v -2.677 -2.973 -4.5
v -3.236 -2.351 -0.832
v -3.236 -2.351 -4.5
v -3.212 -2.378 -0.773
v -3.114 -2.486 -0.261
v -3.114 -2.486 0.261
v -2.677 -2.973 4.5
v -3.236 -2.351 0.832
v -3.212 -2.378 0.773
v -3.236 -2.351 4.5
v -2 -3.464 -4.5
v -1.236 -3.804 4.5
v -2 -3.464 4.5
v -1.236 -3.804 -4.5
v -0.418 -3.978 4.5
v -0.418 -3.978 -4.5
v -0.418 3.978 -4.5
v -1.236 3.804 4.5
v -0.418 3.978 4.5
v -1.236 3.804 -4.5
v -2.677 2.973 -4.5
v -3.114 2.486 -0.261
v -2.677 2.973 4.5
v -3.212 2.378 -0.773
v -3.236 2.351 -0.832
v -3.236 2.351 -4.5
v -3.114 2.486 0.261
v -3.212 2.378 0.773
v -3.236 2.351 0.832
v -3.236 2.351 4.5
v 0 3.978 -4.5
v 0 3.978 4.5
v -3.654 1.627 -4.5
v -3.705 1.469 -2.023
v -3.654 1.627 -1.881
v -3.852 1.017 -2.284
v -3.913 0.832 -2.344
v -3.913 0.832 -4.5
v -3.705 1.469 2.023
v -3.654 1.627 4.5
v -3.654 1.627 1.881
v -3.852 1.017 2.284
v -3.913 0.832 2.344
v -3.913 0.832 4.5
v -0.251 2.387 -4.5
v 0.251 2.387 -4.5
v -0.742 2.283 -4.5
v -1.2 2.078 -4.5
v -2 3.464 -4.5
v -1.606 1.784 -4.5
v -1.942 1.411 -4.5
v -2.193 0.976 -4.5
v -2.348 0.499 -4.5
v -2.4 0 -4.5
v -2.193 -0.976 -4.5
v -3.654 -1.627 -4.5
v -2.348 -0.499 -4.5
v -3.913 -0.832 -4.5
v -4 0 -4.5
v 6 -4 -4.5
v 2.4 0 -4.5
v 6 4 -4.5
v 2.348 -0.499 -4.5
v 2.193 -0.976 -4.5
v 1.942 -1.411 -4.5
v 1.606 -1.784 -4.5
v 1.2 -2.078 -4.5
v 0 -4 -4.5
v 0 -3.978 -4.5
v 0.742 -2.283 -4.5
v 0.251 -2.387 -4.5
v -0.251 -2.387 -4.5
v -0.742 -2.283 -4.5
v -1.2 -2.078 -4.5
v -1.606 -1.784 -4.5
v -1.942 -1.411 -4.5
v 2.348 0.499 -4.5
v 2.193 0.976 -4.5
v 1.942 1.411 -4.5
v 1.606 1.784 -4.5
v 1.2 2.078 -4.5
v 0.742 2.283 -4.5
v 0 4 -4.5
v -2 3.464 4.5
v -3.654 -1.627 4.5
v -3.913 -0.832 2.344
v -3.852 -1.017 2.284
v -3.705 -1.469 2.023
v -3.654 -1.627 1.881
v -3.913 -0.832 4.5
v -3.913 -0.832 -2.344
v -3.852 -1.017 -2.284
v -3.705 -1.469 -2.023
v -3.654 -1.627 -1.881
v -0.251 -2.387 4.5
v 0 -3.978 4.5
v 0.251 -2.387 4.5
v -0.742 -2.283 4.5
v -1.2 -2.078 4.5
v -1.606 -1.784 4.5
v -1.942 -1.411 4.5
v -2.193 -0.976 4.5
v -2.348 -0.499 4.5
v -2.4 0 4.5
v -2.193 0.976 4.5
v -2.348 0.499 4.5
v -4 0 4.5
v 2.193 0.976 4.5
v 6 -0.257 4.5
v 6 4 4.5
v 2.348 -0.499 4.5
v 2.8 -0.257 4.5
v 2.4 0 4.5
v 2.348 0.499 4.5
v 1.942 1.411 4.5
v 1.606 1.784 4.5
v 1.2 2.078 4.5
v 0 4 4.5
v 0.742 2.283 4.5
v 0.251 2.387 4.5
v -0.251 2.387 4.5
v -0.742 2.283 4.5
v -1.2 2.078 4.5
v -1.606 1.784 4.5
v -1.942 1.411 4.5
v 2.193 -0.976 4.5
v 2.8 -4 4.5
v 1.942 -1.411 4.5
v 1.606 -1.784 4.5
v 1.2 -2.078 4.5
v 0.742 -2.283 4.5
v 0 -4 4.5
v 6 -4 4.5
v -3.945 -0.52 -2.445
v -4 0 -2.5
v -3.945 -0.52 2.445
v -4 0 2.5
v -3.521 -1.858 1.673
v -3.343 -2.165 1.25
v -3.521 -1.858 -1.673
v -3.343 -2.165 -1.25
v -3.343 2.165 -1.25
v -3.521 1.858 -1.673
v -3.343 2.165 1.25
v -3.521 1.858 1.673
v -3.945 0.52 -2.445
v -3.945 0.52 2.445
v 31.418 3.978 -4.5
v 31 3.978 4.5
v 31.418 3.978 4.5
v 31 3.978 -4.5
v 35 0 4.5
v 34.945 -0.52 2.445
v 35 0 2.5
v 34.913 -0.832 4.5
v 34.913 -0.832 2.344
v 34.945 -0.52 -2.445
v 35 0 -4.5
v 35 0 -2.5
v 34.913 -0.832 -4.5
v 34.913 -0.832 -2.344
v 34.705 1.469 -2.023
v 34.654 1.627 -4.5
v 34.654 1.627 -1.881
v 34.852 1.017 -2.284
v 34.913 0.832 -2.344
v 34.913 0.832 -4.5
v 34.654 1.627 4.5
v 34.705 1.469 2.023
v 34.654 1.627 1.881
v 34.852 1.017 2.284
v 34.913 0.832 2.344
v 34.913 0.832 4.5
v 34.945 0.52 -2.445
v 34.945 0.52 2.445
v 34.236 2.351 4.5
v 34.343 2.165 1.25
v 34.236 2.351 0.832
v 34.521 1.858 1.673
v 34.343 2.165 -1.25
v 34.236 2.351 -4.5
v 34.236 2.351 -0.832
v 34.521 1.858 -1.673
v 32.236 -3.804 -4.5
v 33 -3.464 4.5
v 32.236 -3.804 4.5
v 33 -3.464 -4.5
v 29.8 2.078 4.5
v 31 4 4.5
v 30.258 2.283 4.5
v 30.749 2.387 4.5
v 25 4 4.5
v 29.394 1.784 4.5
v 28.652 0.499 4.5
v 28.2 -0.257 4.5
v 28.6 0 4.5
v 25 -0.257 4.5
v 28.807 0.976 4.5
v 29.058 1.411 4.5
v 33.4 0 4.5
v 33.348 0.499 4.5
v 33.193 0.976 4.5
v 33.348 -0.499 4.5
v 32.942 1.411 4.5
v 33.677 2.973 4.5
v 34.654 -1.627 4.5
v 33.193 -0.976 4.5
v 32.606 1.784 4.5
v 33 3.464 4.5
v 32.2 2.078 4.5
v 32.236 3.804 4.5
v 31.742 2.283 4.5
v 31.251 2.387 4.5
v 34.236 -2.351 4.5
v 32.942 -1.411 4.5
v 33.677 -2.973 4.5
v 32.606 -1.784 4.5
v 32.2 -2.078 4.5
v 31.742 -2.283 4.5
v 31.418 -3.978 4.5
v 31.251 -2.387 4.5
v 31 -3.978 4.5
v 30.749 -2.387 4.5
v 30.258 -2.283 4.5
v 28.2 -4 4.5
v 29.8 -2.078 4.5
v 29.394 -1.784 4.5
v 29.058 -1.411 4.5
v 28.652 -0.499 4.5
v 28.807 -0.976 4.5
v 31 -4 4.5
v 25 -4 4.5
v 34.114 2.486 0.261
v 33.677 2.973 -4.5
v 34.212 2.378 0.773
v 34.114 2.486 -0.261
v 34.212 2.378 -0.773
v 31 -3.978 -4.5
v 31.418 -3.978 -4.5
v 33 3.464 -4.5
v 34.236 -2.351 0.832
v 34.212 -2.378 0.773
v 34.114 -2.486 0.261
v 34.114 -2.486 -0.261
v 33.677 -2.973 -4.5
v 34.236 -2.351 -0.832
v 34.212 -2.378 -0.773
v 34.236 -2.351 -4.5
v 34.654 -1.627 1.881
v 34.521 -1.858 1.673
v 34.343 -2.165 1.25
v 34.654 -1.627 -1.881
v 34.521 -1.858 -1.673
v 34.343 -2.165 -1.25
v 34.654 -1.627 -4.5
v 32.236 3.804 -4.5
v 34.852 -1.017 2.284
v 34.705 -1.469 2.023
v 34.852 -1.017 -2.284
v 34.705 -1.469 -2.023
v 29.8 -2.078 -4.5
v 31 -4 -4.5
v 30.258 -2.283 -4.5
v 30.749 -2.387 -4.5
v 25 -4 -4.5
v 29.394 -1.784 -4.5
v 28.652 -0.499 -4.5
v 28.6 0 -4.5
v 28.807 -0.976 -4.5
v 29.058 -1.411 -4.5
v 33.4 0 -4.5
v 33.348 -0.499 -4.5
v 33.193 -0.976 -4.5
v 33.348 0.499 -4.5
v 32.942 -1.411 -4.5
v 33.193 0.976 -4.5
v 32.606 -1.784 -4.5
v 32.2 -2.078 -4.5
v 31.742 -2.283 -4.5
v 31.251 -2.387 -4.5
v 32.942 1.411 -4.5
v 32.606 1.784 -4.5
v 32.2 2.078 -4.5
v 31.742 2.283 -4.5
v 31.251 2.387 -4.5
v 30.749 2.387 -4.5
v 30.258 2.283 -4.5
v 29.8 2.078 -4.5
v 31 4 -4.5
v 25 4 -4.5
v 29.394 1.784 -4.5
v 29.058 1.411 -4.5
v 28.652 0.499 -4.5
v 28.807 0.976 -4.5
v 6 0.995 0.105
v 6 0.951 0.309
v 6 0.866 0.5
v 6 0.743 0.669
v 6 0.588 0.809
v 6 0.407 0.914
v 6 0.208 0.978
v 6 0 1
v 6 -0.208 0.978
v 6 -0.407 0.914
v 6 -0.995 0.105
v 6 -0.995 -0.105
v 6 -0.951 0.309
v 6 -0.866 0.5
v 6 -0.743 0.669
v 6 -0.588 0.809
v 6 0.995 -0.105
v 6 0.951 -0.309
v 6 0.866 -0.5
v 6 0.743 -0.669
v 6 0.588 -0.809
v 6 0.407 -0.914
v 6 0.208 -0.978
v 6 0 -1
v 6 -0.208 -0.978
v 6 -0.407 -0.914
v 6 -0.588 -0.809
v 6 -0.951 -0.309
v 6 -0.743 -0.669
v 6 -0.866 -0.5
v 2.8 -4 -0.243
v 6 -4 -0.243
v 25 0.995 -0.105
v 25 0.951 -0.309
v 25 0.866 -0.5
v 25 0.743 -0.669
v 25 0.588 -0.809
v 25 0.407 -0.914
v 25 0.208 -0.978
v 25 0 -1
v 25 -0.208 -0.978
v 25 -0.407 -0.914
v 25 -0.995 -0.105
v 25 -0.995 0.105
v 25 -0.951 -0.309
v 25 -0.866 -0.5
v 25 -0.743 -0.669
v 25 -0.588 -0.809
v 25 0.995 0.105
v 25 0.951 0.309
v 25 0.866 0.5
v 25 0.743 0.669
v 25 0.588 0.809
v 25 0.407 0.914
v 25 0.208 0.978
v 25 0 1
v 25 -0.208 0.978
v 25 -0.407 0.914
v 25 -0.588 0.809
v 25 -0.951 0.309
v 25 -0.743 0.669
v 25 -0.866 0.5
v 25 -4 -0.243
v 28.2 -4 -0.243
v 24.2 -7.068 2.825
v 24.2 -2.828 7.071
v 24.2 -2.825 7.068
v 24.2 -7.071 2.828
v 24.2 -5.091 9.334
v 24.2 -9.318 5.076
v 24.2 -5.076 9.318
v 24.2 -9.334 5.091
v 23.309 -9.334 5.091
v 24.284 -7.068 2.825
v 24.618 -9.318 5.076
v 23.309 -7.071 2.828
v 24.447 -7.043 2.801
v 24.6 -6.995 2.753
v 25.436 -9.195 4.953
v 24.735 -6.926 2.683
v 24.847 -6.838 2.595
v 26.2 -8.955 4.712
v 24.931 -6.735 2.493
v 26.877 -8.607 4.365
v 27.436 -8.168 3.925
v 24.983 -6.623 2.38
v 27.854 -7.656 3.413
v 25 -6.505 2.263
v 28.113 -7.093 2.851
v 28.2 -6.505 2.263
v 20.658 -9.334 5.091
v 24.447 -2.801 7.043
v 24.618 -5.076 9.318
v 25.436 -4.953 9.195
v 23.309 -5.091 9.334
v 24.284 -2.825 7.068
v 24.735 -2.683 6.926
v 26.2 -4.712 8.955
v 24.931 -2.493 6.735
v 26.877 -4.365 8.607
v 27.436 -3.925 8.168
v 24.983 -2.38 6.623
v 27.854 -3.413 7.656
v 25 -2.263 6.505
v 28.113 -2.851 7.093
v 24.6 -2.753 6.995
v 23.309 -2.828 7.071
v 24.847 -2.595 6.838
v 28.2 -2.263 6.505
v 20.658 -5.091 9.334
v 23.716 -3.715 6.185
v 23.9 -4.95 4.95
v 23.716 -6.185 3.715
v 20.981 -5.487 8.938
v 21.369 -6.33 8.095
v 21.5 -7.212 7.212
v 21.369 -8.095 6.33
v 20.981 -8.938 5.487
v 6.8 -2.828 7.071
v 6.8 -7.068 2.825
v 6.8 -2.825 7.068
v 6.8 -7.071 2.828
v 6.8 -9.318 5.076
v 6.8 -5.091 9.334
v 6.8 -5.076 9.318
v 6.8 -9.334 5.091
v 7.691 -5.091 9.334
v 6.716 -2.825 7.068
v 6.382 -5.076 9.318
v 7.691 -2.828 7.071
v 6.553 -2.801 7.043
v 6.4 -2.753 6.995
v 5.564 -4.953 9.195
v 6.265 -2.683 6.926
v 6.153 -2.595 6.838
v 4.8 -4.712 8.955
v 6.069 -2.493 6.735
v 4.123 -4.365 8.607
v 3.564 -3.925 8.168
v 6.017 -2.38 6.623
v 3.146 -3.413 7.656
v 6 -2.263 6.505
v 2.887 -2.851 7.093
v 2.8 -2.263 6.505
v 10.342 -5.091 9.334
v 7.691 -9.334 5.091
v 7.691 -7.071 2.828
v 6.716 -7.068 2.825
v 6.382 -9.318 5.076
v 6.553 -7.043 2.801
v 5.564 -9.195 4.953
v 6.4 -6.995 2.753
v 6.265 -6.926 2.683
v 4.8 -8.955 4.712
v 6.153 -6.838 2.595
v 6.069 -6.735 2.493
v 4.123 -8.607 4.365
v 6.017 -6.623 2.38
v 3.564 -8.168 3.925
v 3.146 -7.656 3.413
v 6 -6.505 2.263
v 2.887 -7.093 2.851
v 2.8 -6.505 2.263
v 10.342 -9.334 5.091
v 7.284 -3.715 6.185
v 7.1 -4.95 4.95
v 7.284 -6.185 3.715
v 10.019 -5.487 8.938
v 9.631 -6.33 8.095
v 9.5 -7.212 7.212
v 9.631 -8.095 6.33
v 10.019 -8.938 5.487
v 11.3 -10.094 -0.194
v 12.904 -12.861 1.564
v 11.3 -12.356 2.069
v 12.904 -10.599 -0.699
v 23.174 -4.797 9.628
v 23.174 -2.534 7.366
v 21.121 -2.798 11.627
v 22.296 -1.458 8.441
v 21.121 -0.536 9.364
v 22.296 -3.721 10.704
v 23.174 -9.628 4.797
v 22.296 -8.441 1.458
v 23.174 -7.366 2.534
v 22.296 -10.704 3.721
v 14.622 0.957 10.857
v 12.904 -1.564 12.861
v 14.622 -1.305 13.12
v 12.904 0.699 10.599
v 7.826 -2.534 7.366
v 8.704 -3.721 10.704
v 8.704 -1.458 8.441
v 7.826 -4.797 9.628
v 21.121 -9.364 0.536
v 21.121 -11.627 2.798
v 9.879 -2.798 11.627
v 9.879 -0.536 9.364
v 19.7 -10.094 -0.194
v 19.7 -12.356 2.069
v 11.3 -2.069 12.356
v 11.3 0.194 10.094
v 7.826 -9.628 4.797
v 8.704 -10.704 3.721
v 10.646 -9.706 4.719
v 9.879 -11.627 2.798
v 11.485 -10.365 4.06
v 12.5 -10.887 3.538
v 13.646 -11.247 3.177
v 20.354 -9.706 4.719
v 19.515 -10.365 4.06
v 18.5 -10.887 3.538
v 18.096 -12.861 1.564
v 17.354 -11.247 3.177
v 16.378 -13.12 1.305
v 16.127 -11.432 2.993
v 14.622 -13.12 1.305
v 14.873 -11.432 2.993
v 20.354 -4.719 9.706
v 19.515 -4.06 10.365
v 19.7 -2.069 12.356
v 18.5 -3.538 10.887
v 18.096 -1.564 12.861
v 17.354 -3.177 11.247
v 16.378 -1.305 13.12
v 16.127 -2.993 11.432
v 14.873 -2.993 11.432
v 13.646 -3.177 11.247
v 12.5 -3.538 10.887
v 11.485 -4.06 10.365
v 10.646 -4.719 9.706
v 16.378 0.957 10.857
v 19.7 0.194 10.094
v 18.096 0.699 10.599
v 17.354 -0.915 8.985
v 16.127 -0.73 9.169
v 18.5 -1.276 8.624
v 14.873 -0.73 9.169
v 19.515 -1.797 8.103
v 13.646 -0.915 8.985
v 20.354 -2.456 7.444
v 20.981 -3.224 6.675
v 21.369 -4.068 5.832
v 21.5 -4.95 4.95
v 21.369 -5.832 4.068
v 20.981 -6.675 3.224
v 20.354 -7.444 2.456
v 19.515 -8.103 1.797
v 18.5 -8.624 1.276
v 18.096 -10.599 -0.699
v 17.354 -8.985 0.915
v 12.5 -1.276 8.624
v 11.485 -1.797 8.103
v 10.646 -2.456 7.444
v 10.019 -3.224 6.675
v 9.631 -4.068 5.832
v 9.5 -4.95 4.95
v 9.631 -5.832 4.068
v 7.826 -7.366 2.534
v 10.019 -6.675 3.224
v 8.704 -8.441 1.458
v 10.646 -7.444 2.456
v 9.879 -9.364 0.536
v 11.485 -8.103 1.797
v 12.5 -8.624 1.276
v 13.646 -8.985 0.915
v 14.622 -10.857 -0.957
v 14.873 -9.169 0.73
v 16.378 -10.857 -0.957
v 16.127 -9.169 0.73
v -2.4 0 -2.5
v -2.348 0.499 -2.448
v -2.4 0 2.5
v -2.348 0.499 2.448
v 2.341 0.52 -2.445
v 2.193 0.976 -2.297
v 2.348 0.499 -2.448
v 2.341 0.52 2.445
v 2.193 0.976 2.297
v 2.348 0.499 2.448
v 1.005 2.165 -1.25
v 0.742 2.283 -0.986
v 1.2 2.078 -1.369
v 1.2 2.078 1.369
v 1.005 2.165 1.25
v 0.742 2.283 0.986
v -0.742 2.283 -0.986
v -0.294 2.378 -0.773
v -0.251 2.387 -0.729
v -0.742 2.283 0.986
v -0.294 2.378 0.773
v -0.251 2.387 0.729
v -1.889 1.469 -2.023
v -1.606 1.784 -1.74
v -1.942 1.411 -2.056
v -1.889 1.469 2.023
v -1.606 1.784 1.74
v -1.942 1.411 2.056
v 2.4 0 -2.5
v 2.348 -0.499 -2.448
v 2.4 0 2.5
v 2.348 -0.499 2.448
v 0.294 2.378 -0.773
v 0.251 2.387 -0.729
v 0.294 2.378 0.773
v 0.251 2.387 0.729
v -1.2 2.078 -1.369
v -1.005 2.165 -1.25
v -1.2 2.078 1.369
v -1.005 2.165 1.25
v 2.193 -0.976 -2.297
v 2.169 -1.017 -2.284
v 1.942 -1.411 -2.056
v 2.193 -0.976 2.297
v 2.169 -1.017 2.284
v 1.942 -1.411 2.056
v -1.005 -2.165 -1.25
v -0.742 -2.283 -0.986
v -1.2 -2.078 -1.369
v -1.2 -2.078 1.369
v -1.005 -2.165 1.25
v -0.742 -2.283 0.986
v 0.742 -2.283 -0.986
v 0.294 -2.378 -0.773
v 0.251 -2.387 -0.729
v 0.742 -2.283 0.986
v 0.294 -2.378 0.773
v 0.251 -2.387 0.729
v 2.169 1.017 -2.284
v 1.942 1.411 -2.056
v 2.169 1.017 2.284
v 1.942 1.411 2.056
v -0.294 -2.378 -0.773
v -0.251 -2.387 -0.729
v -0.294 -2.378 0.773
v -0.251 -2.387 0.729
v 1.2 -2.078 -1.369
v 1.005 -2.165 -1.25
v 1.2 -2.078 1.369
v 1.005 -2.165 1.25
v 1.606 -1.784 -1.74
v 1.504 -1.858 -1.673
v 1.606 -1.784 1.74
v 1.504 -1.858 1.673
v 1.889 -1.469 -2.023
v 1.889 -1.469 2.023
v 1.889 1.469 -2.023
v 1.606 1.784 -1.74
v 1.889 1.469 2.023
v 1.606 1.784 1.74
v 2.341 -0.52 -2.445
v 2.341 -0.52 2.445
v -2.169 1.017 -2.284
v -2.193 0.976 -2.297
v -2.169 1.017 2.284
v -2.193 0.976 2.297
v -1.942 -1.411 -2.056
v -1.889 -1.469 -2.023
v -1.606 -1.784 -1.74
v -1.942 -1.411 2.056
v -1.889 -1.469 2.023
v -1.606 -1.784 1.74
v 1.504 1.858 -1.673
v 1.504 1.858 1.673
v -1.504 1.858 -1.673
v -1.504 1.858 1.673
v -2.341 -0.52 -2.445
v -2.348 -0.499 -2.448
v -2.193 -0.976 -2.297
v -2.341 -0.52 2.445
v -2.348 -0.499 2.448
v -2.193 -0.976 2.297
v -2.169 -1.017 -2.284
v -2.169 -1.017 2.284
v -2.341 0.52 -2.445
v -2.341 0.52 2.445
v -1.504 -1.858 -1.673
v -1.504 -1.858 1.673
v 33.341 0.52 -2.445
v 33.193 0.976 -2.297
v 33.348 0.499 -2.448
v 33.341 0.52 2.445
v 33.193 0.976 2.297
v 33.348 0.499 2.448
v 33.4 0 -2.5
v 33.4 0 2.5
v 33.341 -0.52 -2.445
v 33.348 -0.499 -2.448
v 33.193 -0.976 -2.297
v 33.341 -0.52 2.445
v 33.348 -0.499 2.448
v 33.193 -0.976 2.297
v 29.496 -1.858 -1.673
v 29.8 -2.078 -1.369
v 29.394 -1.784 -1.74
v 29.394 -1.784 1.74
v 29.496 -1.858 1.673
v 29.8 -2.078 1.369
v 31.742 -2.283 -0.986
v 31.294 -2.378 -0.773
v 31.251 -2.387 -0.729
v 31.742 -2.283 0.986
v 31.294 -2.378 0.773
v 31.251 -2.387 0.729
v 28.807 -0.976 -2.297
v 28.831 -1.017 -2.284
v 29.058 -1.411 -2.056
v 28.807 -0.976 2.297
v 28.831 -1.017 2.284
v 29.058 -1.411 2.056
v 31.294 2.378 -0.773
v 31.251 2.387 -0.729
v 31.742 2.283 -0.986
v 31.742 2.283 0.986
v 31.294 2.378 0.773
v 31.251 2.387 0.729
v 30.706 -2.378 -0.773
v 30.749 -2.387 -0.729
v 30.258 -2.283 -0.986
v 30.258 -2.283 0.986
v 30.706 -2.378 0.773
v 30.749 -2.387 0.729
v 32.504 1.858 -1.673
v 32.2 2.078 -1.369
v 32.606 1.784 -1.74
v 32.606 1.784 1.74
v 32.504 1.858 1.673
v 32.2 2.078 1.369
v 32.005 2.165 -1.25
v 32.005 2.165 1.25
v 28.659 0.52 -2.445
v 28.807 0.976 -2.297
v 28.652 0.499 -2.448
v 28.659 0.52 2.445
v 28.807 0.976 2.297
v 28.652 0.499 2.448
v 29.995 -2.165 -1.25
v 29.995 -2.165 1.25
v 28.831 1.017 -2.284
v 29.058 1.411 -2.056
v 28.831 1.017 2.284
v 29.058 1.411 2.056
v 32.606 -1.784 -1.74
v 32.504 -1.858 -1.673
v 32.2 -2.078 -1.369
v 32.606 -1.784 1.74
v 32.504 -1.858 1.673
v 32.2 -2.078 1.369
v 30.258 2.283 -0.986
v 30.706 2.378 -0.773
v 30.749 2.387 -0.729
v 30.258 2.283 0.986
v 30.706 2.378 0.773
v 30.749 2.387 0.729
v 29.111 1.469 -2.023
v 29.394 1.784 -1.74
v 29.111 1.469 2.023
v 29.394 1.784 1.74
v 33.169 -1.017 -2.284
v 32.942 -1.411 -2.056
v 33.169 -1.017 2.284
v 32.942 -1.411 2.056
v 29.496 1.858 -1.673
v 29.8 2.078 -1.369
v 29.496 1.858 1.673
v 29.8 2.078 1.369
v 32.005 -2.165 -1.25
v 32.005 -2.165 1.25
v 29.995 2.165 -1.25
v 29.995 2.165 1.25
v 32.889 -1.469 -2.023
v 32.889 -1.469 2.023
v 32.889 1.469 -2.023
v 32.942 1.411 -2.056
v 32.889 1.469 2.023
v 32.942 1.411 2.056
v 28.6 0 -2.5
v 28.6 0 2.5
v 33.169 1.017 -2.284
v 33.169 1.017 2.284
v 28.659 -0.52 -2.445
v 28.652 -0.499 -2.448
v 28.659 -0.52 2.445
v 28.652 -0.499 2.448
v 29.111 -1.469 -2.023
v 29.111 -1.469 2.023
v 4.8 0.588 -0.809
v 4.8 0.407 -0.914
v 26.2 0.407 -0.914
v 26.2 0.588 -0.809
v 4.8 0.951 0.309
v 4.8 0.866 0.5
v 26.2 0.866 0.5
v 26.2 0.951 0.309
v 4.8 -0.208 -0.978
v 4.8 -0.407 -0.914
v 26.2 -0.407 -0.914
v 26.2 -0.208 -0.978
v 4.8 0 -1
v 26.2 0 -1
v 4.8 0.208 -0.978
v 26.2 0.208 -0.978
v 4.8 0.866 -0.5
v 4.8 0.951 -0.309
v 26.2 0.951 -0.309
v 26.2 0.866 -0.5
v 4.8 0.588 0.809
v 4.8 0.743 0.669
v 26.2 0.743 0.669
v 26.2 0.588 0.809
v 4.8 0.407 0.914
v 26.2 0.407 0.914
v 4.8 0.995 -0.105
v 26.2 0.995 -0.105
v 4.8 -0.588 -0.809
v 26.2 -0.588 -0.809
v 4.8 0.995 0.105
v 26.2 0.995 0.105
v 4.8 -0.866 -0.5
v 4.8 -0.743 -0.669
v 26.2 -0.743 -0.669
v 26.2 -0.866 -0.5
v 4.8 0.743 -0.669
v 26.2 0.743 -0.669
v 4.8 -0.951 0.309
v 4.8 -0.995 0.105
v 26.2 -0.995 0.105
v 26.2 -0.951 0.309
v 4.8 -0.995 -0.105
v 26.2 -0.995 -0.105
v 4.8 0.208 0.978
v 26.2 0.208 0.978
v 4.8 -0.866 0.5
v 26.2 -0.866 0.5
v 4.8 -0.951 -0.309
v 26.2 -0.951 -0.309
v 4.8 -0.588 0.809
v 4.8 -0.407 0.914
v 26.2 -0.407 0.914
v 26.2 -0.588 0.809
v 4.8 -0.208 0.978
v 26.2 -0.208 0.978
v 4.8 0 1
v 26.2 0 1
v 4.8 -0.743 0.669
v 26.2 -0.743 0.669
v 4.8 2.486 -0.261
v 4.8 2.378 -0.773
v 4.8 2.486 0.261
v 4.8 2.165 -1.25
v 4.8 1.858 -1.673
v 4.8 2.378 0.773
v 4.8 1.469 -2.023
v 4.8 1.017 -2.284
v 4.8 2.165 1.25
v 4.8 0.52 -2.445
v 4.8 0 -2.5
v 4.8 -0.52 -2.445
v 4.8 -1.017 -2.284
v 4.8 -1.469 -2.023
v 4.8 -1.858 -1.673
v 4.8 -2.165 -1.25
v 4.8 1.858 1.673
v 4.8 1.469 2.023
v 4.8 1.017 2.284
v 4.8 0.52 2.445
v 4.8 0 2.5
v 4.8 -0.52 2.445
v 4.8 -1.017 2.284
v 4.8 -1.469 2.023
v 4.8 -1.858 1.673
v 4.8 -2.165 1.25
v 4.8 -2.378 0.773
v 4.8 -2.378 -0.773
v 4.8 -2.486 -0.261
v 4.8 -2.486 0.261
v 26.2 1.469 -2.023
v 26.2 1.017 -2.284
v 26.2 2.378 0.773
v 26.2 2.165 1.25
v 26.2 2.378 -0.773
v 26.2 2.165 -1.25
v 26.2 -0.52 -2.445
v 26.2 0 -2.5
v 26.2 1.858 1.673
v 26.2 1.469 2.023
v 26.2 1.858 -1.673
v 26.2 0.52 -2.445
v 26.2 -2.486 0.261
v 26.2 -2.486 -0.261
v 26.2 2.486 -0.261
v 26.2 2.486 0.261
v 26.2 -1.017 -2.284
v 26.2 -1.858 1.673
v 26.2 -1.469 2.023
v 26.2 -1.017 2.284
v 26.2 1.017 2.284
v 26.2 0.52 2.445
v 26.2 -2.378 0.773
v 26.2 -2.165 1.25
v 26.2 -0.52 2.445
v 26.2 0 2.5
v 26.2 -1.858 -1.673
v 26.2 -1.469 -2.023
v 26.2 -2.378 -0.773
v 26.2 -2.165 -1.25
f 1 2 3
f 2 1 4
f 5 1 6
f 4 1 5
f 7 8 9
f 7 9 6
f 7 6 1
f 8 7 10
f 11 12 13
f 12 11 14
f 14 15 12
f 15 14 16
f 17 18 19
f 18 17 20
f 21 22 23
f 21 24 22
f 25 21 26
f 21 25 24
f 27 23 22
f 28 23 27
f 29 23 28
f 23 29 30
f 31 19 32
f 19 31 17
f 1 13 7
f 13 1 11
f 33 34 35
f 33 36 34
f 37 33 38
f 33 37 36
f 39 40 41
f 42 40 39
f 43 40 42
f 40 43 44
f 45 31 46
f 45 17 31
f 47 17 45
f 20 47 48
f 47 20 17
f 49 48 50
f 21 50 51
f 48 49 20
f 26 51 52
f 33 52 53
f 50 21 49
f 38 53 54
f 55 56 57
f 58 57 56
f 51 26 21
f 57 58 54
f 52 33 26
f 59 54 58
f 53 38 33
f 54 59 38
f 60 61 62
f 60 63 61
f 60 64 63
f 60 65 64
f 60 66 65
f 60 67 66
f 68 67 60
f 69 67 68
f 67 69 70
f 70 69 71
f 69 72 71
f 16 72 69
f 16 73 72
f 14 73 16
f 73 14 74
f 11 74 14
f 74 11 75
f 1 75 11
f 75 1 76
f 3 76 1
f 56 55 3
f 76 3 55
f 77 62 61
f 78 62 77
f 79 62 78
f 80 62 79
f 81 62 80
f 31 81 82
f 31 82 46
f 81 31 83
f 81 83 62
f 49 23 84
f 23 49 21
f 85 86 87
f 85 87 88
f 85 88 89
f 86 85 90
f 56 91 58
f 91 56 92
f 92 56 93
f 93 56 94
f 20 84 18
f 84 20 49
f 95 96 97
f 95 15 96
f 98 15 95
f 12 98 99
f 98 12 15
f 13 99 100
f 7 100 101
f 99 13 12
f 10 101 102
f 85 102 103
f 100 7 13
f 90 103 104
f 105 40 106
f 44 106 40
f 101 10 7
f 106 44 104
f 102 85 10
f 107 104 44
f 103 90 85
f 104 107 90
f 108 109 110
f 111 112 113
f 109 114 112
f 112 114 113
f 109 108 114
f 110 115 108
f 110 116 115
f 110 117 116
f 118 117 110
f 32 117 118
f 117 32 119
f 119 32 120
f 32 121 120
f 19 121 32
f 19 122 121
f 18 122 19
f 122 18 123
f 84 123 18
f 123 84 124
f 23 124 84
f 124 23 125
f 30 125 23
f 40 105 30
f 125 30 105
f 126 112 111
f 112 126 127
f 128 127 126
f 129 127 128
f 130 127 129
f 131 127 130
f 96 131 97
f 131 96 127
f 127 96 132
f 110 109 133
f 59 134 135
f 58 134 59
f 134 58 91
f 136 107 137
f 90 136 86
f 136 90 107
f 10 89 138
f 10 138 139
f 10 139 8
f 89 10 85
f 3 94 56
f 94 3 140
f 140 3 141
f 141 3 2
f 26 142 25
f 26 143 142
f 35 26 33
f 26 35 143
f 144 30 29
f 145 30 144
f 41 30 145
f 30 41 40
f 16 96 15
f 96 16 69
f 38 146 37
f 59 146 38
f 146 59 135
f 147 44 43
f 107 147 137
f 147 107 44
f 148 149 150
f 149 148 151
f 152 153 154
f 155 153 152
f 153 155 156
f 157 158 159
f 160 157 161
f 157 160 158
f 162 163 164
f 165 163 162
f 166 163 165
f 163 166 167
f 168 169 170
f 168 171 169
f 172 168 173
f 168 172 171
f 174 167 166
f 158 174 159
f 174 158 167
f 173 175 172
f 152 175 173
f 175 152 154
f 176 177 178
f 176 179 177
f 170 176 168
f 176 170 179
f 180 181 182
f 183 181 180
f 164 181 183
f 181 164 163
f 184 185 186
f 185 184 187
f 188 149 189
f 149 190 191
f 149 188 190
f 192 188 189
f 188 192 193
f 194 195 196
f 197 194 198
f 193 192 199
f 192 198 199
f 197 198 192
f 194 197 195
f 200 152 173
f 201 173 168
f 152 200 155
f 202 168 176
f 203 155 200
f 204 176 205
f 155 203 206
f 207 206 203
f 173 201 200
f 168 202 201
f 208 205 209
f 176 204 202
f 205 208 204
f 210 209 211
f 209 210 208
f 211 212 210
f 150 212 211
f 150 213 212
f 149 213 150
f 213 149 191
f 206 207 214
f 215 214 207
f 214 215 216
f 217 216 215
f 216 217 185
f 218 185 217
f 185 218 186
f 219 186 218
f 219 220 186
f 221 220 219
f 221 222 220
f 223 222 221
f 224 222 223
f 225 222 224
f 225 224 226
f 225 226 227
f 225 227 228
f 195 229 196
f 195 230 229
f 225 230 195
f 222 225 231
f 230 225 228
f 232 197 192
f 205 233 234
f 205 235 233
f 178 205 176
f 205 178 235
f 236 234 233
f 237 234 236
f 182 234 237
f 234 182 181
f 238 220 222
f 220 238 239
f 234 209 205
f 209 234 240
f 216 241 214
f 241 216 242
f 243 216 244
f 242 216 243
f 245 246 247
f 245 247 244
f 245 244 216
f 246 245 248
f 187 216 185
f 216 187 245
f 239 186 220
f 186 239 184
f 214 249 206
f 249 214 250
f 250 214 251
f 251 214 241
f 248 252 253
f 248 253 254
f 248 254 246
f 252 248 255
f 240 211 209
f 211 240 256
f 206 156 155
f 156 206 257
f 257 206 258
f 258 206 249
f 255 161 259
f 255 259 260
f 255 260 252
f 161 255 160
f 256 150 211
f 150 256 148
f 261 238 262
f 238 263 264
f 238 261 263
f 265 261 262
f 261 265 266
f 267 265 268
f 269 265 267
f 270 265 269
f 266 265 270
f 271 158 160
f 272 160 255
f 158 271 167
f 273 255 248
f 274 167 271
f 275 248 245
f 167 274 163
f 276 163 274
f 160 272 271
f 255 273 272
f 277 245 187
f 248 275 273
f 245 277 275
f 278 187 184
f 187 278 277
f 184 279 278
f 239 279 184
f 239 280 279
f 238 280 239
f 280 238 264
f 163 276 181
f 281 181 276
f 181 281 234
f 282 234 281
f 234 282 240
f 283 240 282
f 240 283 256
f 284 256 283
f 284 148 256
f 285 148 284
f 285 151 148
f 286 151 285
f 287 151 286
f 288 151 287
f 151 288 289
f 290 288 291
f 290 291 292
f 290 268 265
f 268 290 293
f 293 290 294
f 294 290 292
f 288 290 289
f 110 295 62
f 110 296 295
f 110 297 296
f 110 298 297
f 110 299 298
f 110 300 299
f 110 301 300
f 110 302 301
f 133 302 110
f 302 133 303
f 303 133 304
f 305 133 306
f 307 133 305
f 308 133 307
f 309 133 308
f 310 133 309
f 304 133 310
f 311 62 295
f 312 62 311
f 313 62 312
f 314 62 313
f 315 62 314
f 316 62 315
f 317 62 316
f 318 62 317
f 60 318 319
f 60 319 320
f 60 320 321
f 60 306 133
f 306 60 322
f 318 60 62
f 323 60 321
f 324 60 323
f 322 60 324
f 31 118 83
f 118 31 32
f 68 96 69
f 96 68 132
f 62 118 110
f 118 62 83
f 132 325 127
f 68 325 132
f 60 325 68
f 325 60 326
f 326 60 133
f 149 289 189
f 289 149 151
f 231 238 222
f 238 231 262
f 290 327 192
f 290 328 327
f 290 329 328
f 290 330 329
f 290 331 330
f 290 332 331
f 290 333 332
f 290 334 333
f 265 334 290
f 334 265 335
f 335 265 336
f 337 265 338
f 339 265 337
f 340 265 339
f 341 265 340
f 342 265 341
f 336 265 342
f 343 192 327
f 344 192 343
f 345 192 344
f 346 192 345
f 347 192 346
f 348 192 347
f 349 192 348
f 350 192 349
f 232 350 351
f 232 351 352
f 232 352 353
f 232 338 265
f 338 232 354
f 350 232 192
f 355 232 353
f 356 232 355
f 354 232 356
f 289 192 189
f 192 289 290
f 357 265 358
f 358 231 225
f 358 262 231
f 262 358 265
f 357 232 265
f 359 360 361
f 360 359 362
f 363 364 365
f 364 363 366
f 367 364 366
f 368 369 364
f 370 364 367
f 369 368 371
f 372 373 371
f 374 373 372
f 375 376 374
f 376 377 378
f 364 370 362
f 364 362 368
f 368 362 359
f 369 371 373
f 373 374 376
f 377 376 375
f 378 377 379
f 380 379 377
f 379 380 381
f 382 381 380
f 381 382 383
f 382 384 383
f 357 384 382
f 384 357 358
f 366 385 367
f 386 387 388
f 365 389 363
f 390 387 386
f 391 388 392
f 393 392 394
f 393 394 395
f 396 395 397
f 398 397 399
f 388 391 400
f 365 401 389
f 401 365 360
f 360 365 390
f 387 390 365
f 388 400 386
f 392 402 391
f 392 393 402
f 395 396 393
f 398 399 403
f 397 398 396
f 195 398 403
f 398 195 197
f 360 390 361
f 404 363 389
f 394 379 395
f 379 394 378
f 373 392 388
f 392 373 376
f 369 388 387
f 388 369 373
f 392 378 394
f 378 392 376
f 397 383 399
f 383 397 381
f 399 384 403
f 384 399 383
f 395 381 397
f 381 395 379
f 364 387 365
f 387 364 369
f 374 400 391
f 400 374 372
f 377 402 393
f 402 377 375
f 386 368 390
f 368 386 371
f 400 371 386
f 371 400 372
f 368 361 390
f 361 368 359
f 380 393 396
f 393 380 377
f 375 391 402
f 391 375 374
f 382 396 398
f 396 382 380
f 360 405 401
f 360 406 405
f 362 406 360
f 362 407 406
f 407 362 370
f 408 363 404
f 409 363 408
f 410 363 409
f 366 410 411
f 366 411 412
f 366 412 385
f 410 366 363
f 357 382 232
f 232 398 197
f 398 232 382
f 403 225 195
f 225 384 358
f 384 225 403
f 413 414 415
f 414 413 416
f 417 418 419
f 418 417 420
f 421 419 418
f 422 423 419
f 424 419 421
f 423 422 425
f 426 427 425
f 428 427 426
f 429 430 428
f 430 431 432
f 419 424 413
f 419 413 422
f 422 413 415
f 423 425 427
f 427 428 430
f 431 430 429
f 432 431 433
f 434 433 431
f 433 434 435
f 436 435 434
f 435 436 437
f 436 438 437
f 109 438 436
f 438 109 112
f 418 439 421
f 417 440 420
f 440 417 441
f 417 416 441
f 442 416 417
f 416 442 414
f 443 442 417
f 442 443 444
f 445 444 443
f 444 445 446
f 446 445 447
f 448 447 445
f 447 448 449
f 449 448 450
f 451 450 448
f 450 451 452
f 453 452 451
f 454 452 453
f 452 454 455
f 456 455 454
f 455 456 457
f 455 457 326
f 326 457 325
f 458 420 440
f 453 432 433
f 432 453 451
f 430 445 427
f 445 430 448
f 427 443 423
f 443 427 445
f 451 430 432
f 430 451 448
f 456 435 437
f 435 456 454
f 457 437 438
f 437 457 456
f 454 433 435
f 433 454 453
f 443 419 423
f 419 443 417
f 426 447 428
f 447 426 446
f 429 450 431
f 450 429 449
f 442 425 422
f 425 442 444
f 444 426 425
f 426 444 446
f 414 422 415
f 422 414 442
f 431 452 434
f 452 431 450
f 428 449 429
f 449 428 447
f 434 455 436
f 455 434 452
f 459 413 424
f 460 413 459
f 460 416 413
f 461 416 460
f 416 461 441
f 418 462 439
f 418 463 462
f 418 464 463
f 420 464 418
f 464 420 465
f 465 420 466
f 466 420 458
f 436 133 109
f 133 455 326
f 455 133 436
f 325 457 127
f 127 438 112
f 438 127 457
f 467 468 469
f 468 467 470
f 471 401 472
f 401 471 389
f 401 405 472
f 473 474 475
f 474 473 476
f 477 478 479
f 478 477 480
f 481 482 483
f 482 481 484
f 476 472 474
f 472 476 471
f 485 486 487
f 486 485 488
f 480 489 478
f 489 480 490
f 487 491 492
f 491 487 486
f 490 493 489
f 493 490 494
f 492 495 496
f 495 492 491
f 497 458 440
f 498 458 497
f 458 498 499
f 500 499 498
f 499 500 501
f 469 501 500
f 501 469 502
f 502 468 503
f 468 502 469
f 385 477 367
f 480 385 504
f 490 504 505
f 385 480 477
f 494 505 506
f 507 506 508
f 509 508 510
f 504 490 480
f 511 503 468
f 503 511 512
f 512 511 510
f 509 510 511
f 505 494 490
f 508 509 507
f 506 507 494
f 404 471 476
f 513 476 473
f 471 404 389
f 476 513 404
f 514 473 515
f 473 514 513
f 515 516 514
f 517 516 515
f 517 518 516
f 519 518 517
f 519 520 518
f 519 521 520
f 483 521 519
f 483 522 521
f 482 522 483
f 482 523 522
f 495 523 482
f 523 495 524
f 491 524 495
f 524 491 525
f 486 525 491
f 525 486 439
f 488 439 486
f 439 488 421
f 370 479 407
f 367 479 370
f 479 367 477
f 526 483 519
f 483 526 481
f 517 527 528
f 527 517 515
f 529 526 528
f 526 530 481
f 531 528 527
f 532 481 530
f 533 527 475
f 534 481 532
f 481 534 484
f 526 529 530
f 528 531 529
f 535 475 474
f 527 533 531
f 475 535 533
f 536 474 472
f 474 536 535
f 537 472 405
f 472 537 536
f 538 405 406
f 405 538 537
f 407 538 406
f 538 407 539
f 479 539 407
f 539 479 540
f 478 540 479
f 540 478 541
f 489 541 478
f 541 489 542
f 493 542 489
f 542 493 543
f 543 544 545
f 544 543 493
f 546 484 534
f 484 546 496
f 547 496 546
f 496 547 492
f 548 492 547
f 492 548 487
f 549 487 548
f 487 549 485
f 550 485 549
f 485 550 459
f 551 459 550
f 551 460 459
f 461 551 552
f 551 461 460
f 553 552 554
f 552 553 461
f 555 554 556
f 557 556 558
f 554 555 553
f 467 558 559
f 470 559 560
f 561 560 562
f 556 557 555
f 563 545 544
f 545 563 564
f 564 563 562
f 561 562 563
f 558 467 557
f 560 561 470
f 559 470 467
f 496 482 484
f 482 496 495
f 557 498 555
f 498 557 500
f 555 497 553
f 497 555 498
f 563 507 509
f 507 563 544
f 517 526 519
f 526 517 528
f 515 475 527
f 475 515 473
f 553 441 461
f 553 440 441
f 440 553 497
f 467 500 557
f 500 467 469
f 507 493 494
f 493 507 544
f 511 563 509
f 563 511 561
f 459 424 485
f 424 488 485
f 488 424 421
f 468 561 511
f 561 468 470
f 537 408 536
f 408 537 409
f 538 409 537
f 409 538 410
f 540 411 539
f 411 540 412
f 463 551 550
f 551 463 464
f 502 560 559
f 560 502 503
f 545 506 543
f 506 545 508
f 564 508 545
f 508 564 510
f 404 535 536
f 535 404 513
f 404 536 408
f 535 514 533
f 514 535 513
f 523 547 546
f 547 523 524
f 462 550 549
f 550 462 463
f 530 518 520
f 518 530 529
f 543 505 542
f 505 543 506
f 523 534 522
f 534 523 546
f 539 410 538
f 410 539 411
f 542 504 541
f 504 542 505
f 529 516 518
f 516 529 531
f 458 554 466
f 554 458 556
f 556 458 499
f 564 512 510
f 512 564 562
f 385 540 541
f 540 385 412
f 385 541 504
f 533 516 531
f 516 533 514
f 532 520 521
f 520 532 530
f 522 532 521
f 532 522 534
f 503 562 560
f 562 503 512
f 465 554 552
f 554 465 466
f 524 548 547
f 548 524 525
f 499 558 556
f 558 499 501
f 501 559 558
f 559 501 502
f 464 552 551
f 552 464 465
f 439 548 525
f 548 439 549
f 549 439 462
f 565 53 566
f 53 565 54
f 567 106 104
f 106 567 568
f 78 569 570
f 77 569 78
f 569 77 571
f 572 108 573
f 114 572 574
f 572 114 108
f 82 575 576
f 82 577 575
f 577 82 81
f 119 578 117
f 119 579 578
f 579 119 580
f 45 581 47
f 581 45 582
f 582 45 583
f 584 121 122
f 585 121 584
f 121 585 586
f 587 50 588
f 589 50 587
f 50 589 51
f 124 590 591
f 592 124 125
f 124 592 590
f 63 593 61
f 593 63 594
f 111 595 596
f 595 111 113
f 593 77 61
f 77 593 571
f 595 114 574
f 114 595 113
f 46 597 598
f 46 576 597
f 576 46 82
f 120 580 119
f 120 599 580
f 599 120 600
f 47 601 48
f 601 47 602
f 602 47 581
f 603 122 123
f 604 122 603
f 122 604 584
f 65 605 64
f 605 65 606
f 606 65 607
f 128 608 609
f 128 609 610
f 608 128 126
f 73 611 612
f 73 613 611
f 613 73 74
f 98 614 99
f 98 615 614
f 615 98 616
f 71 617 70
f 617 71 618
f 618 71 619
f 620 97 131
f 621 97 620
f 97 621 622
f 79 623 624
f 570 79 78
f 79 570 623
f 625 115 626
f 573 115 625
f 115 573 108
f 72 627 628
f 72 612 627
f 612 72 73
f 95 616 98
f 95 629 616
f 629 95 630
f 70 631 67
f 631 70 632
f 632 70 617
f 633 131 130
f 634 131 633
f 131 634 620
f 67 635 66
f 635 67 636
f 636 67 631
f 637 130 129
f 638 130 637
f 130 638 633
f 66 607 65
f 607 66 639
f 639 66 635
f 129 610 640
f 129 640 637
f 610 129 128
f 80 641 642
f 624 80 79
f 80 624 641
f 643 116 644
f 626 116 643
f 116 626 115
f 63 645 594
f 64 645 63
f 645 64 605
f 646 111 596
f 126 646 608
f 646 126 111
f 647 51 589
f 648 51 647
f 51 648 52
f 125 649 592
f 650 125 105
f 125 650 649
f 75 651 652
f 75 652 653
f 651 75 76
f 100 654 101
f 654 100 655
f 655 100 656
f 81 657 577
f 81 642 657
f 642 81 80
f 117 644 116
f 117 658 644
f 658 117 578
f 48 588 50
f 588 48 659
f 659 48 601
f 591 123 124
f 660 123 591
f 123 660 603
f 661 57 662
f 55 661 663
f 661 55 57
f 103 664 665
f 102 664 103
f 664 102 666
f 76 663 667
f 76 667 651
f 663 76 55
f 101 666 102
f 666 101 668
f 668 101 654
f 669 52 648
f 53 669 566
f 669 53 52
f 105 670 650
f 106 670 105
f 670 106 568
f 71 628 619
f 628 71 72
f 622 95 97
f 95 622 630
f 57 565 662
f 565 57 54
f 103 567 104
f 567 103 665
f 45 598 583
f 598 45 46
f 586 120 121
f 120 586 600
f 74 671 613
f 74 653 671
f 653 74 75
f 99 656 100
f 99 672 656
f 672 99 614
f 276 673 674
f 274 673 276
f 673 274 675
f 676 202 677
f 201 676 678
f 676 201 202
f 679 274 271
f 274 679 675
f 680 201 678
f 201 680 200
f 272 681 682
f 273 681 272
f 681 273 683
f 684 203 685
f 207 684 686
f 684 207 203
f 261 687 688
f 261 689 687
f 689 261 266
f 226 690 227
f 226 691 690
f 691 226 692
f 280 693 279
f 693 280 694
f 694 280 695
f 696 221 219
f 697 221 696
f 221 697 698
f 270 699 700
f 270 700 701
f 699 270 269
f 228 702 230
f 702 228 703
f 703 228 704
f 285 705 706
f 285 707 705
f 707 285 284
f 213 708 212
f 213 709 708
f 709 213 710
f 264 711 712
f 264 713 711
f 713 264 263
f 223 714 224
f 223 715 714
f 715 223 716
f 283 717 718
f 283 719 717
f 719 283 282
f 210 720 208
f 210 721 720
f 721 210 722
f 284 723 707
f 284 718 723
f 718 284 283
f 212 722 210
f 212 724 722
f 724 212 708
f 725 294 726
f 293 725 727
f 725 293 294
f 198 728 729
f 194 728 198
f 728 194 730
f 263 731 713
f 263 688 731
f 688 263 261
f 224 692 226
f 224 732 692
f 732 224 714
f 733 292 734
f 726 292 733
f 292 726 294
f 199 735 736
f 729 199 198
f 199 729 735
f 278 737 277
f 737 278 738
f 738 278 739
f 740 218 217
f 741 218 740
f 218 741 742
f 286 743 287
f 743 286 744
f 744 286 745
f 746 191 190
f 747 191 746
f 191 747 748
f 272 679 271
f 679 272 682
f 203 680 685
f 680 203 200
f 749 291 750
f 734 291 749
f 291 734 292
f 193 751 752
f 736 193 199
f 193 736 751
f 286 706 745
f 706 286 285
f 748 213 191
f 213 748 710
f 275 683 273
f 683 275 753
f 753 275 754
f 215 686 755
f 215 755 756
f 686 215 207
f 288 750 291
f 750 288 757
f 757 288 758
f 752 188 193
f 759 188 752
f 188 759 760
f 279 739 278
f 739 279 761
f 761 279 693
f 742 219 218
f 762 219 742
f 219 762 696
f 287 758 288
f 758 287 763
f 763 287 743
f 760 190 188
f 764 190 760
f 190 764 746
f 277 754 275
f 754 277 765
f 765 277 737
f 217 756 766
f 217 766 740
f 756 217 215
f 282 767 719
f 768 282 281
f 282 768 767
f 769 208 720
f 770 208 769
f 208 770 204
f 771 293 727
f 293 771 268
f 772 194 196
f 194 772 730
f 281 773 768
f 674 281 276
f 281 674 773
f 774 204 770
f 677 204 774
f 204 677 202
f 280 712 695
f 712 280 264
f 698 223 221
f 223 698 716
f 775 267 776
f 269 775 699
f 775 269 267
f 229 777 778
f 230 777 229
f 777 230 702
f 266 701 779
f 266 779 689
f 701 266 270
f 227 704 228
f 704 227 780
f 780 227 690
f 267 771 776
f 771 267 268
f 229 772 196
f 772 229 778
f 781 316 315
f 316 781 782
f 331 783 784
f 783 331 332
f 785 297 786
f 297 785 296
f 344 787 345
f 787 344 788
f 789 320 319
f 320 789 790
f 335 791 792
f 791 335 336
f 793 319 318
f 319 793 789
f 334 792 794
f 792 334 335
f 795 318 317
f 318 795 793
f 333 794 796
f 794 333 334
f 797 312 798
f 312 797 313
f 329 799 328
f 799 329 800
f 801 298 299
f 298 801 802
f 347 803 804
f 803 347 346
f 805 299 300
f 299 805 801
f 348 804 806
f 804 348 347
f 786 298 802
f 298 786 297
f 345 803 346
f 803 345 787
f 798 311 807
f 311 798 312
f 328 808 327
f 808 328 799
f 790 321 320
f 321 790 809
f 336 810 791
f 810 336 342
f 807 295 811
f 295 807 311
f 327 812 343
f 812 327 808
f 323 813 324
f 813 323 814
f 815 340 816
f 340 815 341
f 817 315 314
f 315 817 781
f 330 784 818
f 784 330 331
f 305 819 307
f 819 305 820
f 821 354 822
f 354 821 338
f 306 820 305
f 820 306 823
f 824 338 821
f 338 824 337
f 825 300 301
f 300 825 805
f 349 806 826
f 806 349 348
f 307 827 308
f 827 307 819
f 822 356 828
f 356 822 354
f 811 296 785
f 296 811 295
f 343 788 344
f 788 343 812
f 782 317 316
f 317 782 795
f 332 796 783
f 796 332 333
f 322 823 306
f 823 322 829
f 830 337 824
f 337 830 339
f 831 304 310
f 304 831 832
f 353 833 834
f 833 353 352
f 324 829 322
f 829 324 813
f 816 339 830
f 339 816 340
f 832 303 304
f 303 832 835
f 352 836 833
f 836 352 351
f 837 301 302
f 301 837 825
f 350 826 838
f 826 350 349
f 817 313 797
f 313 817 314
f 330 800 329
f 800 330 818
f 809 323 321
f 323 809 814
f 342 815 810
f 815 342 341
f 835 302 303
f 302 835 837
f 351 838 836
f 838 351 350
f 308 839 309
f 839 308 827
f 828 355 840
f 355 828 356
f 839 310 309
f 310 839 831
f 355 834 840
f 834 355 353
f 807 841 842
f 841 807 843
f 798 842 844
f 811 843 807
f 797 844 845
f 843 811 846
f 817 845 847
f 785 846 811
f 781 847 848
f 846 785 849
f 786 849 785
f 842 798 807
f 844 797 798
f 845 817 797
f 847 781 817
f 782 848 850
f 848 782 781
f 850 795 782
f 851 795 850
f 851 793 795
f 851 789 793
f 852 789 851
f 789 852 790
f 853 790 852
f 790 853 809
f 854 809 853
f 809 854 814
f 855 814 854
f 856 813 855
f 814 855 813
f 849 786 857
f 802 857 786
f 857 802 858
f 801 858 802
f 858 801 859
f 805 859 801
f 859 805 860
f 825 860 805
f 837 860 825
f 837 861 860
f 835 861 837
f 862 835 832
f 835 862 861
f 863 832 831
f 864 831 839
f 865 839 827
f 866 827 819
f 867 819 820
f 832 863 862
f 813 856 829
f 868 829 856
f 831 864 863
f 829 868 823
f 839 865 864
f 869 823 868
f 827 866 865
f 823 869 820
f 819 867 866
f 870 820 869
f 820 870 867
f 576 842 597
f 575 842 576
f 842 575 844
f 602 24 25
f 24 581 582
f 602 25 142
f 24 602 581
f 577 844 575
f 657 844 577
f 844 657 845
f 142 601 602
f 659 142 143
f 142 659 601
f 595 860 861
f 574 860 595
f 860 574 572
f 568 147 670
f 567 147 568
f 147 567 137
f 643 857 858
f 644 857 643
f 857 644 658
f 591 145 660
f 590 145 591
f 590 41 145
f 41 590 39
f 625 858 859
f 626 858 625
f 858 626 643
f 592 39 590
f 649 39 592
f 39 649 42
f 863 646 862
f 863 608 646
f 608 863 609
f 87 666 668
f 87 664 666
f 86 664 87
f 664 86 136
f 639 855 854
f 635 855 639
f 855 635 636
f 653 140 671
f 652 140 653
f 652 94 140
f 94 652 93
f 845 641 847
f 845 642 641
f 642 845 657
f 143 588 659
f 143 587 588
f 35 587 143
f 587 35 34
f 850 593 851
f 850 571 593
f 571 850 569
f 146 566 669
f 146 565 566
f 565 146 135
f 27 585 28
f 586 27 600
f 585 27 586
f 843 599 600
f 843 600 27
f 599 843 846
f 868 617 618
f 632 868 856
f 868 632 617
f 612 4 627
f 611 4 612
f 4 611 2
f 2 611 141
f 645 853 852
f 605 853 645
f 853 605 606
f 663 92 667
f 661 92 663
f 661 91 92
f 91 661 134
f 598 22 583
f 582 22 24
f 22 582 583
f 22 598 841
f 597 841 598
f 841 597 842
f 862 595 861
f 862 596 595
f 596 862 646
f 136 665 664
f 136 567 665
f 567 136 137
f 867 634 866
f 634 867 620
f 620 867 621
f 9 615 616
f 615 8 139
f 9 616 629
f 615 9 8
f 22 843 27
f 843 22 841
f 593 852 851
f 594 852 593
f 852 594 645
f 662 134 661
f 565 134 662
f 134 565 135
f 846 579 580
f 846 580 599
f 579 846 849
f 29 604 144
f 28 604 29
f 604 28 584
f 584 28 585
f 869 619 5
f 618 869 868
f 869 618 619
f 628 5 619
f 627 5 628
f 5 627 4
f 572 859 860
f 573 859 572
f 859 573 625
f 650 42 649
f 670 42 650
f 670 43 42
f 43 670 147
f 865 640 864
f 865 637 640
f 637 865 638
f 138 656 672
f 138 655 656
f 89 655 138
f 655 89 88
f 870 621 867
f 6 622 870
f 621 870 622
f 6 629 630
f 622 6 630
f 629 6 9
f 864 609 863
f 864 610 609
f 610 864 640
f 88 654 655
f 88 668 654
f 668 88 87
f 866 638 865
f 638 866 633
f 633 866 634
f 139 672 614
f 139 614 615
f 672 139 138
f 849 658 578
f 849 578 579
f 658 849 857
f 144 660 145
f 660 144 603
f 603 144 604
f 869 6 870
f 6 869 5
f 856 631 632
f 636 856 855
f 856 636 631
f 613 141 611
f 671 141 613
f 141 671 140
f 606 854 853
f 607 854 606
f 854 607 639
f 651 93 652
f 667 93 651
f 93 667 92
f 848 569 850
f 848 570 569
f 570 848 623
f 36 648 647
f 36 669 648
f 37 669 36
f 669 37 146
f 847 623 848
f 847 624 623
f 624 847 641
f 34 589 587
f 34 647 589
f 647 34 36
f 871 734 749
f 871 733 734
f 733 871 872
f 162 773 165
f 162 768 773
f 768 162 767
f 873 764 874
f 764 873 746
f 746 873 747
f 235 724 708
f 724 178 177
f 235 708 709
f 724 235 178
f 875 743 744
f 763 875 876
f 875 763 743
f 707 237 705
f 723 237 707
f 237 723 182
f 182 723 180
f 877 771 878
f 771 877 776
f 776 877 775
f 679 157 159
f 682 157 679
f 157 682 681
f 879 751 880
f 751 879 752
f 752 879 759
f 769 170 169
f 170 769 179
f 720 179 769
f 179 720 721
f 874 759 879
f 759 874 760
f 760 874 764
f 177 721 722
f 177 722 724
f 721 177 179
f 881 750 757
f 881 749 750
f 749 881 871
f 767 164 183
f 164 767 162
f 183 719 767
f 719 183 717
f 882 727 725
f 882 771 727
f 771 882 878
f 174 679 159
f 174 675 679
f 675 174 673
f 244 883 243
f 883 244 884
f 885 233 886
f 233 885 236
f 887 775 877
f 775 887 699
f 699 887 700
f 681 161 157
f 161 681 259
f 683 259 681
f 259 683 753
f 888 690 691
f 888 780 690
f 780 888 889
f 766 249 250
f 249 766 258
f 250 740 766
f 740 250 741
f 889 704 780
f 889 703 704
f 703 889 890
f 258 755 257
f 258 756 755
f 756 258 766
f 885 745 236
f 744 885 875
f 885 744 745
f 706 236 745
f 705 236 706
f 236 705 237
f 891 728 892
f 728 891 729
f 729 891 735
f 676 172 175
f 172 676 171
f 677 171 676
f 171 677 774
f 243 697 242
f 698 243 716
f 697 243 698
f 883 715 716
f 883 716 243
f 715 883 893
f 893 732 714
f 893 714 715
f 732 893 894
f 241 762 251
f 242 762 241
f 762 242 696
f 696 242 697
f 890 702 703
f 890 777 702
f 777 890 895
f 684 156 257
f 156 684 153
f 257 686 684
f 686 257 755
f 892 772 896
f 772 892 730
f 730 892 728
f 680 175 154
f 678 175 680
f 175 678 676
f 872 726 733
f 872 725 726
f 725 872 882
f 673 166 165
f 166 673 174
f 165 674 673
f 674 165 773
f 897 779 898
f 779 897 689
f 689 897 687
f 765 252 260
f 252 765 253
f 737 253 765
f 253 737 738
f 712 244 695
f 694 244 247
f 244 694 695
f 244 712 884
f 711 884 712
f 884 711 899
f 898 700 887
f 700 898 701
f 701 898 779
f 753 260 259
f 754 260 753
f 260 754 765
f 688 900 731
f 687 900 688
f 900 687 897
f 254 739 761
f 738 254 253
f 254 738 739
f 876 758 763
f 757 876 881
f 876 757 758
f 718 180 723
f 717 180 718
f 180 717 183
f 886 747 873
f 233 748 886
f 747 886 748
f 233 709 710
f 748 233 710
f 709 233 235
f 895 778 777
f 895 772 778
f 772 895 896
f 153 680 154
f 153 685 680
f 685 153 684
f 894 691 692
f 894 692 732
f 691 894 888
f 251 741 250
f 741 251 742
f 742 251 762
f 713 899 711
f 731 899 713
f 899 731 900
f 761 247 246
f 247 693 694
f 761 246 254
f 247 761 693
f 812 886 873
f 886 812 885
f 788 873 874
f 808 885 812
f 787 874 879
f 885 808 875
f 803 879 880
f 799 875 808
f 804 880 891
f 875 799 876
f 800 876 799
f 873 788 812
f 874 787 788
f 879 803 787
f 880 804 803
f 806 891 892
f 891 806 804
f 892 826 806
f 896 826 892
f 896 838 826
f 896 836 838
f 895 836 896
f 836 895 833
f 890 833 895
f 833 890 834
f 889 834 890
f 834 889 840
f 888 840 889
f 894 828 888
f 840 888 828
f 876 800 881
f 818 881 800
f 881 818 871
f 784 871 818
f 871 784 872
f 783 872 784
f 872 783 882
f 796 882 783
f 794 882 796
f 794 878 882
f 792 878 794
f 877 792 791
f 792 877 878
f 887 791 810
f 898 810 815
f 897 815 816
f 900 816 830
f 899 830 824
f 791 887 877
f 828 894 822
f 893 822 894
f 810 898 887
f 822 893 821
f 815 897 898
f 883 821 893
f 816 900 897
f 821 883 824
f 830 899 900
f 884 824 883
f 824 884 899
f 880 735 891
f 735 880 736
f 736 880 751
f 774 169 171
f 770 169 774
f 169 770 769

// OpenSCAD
// resolution of curves
$fs = 0.01;

// USER VARIABLES, please change

// centre to centre
standoffSeparation = 31; 
// width of the camera body at the mounting screw point
cameraWidth = 19; 
// outer diameter of the lens / inner diameter of the support
lensInnerDia = 12;
// distance from the mounting screw to the back of the lens ring 
lensOffset = 7;
// how far the camera sits inside the frame, use negative values to sit forwards
cameraInset = 0;
// thickness of material around the lens
lensRingThickness = 2.4; 

// outer diameter minus 0.2mm for a tight fit
standoffOuterDia = 4.8; 
// how far up the standoffs the grips extend vertically
standoffGripHeight = 9;
// amount of material either side of the standoff
standoffGripThickness = 1.6; 
// desired amount of uptilt
cameraAngle = 45; 
// distance from the back of the lens ring to the front
lensHeight = 3.2; 
// how wide the arms are where it meets the lens ring
armHeight = 6; 
// external fillet on the lens ring arms
armRadius = 4;
// size of the screw hole 
screwDia = 2; 
// size of the hole to access the screw
screwDriverDia = 5; 

// CALCULATED VARIABLES, do not change
standoffOuterRad = standoffOuterDia / 2;
standoffGripOuterRad = standoffOuterRad + standoffGripThickness;
standoffGripOuterDia = standoffGripOuterRad * 2;
standoffHeight = standoffGripHeight + 10; // can be any large number, only used for cutting holes
lensInnerRad = lensInnerDia /2;
lensOuterDia = lensInnerDia + (lensRingThickness * 2);
lensOuterRad = lensOuterDia / 2;
LensRingSupportLength = lensOffset + lensHeight; // TODO should be based on the lens offset
LensRingSupportWidth = cameraWidth / 2; // takes us towards the ring, overlap to be cutoff
screwRad = screwDia / 2;
screwDriverRad = screwDriverDia / 2;
screwDriverLength = standoffGripOuterDia * 2; // big enough to stick clear out of the side
standoffGripWidth = (standoffSeparation - cameraWidth) / 2; // width of the standoff blocks to reach the camera
standoffGripInset = cameraInset < 0 ? cameraInset : 0; // how far the standoff grips extend forward

module bevelOuter(outerRadius, length){
    outerDia = outerRadius*2;
    intersection() {
        translate([-outerDia,-outerDia,0]){
            cube([outerDia, outerDia, length]);
        }
        cylinder(length, outerRadius, outerRadius);
    }
}
module bevelInner(innerRadius, length){
    innerDia = innerRadius*2;
    difference() {
        translate([-innerRadius,-innerRadius,0]){
            cube([innerRadius, innerRadius, length]);
        }
        cylinder(length, innerRadius, innerRadius);
    }
}
module bevelBoth(overallSize, joinSize, extrude){
    differenceSize = overallSize-joinSize;
    difference(){
        cube([overallSize, overallSize, extrude]);
        translate([overallSize,overallSize,0]){
            bevelInner(overallSize, extrude);
        }
        translate([overallSize,overallSize,0]){
            bevelOuter(differenceSize, extrude);
        }
    }
}
module lensHolder(){
    difference(){
        union(){
           
            // LHS suport arm
            // moves it so the rotation point is around the screw hole
            translate([lensHeight * 2 + cameraWidth, -LensRingSupportLength, armHeight/2]){
                rotate([0,180,0]){
                    LensRingSupport(LensRingSupportLength, LensRingSupportWidth, armRadius, armHeight, lensHeight);
                }           
            }

            // RHS suport arm
            // moves it so the rotation point is around the screw hole
            translate([0, -LensRingSupportLength, -armHeight/2]){
                LensRingSupport(LensRingSupportLength, LensRingSupportWidth, armRadius, armHeight, lensHeight);           
            }

            // lens ring
            translate([(cameraWidth/2) + lensHeight,-(LensRingSupportLength - lensHeight),0]){
                rotate([90,0,0]){
                    // pipe(lensInnerDia, lensOuterDia, lensHeight);
                    cylinder(lensHeight, lensOuterRad, lensOuterRad);
                }                  
            }
        }

        translate([(cameraWidth/2) + lensHeight,-(LensRingSupportLength - lensHeight),0]){
            // lens hole cutter
            translate([0, 2, 0]){
                rotate([90,0,0]){
                    cylinder(lensHeight + 4, lensInnerRad, lensInnerRad);
                }
            }
        }
    }
}
module LensRingSupport(supportLength, supportWidth, bevelRadius, extrudeHeight, supportThickness){
    extendLength = supportLength - bevelRadius;
    extendWidth = supportWidth - bevelRadius;
    union(){
        // small support to lens ring
        translate([bevelRadius, 0, 0]){
            cube([extendWidth, supportThickness, extrudeHeight]);
        }
        // large support to arm grips
        translate([0, bevelRadius, 0]){
            cube([supportThickness, extendLength, extrudeHeight]);
        }
        translate([0, 0, 0]){
            bevelBoth(bevelRadius, supportThickness, extrudeHeight);
        }
    }
}

difference(){
    // keepers
    union(){
        // standoff grips
        translate([0,0,-standoffGripHeight/2]){
            cylinder(standoffGripHeight, standoffGripOuterRad, standoffGripOuterRad);
            translate([standoffSeparation,0,0]){
                cylinder(standoffGripHeight, standoffGripOuterRad, standoffGripOuterRad);
            }
        }
        // standoff grip blocks
        translate([0,0,-standoffGripHeight/2]){
            translate([0,-standoffGripOuterRad + standoffGripInset,0]){
                cube([standoffGripWidth, standoffGripOuterDia + abs(cameraInset), standoffGripHeight]);
            }
            translate([standoffSeparation - standoffGripWidth, -standoffGripOuterRad + standoffGripInset,0]){
                cube([standoffGripWidth, standoffGripOuterDia + abs(cameraInset), standoffGripHeight]);
            }
        }
        // lens ring holder
        translate([standoffGripWidth-lensHeight, cameraInset, 0]){
            rotate([-cameraAngle,0,0]){
                lensHolder();
            }
        }
    }
    // cutters    
    union(){
        // standoffs
        translate([0,0,-standoffHeight/2]){
            cylinder(standoffHeight, standoffOuterRad, standoffOuterRad);
            translate([standoffSeparation,0,0]){
                cylinder(standoffHeight, standoffOuterRad, standoffOuterRad);
            }
        }
        // screw hole
        translate([-standoffSeparation/2, cameraInset, 0]){
            rotate([0,90,0]){
                cylinder(standoffSeparation*2, screwRad, screwRad);
            }
        }
        // screwdriver hole RH
        translate([standoffGripWidth - 1.2, cameraInset, 0]){
            rotate([0,-90,0]){
                cylinder(screwDriverLength, screwDriverRad, screwDriverRad);
            }
        }
        // screwdriver hole LH
        translate([standoffSeparation - (standoffGripWidth - 1.2), cameraInset, 0]){
            rotate([0,90,0]){
                cylinder(screwDriverLength, screwDriverRad, screwDriverRad);
            }
        }
    }



}
